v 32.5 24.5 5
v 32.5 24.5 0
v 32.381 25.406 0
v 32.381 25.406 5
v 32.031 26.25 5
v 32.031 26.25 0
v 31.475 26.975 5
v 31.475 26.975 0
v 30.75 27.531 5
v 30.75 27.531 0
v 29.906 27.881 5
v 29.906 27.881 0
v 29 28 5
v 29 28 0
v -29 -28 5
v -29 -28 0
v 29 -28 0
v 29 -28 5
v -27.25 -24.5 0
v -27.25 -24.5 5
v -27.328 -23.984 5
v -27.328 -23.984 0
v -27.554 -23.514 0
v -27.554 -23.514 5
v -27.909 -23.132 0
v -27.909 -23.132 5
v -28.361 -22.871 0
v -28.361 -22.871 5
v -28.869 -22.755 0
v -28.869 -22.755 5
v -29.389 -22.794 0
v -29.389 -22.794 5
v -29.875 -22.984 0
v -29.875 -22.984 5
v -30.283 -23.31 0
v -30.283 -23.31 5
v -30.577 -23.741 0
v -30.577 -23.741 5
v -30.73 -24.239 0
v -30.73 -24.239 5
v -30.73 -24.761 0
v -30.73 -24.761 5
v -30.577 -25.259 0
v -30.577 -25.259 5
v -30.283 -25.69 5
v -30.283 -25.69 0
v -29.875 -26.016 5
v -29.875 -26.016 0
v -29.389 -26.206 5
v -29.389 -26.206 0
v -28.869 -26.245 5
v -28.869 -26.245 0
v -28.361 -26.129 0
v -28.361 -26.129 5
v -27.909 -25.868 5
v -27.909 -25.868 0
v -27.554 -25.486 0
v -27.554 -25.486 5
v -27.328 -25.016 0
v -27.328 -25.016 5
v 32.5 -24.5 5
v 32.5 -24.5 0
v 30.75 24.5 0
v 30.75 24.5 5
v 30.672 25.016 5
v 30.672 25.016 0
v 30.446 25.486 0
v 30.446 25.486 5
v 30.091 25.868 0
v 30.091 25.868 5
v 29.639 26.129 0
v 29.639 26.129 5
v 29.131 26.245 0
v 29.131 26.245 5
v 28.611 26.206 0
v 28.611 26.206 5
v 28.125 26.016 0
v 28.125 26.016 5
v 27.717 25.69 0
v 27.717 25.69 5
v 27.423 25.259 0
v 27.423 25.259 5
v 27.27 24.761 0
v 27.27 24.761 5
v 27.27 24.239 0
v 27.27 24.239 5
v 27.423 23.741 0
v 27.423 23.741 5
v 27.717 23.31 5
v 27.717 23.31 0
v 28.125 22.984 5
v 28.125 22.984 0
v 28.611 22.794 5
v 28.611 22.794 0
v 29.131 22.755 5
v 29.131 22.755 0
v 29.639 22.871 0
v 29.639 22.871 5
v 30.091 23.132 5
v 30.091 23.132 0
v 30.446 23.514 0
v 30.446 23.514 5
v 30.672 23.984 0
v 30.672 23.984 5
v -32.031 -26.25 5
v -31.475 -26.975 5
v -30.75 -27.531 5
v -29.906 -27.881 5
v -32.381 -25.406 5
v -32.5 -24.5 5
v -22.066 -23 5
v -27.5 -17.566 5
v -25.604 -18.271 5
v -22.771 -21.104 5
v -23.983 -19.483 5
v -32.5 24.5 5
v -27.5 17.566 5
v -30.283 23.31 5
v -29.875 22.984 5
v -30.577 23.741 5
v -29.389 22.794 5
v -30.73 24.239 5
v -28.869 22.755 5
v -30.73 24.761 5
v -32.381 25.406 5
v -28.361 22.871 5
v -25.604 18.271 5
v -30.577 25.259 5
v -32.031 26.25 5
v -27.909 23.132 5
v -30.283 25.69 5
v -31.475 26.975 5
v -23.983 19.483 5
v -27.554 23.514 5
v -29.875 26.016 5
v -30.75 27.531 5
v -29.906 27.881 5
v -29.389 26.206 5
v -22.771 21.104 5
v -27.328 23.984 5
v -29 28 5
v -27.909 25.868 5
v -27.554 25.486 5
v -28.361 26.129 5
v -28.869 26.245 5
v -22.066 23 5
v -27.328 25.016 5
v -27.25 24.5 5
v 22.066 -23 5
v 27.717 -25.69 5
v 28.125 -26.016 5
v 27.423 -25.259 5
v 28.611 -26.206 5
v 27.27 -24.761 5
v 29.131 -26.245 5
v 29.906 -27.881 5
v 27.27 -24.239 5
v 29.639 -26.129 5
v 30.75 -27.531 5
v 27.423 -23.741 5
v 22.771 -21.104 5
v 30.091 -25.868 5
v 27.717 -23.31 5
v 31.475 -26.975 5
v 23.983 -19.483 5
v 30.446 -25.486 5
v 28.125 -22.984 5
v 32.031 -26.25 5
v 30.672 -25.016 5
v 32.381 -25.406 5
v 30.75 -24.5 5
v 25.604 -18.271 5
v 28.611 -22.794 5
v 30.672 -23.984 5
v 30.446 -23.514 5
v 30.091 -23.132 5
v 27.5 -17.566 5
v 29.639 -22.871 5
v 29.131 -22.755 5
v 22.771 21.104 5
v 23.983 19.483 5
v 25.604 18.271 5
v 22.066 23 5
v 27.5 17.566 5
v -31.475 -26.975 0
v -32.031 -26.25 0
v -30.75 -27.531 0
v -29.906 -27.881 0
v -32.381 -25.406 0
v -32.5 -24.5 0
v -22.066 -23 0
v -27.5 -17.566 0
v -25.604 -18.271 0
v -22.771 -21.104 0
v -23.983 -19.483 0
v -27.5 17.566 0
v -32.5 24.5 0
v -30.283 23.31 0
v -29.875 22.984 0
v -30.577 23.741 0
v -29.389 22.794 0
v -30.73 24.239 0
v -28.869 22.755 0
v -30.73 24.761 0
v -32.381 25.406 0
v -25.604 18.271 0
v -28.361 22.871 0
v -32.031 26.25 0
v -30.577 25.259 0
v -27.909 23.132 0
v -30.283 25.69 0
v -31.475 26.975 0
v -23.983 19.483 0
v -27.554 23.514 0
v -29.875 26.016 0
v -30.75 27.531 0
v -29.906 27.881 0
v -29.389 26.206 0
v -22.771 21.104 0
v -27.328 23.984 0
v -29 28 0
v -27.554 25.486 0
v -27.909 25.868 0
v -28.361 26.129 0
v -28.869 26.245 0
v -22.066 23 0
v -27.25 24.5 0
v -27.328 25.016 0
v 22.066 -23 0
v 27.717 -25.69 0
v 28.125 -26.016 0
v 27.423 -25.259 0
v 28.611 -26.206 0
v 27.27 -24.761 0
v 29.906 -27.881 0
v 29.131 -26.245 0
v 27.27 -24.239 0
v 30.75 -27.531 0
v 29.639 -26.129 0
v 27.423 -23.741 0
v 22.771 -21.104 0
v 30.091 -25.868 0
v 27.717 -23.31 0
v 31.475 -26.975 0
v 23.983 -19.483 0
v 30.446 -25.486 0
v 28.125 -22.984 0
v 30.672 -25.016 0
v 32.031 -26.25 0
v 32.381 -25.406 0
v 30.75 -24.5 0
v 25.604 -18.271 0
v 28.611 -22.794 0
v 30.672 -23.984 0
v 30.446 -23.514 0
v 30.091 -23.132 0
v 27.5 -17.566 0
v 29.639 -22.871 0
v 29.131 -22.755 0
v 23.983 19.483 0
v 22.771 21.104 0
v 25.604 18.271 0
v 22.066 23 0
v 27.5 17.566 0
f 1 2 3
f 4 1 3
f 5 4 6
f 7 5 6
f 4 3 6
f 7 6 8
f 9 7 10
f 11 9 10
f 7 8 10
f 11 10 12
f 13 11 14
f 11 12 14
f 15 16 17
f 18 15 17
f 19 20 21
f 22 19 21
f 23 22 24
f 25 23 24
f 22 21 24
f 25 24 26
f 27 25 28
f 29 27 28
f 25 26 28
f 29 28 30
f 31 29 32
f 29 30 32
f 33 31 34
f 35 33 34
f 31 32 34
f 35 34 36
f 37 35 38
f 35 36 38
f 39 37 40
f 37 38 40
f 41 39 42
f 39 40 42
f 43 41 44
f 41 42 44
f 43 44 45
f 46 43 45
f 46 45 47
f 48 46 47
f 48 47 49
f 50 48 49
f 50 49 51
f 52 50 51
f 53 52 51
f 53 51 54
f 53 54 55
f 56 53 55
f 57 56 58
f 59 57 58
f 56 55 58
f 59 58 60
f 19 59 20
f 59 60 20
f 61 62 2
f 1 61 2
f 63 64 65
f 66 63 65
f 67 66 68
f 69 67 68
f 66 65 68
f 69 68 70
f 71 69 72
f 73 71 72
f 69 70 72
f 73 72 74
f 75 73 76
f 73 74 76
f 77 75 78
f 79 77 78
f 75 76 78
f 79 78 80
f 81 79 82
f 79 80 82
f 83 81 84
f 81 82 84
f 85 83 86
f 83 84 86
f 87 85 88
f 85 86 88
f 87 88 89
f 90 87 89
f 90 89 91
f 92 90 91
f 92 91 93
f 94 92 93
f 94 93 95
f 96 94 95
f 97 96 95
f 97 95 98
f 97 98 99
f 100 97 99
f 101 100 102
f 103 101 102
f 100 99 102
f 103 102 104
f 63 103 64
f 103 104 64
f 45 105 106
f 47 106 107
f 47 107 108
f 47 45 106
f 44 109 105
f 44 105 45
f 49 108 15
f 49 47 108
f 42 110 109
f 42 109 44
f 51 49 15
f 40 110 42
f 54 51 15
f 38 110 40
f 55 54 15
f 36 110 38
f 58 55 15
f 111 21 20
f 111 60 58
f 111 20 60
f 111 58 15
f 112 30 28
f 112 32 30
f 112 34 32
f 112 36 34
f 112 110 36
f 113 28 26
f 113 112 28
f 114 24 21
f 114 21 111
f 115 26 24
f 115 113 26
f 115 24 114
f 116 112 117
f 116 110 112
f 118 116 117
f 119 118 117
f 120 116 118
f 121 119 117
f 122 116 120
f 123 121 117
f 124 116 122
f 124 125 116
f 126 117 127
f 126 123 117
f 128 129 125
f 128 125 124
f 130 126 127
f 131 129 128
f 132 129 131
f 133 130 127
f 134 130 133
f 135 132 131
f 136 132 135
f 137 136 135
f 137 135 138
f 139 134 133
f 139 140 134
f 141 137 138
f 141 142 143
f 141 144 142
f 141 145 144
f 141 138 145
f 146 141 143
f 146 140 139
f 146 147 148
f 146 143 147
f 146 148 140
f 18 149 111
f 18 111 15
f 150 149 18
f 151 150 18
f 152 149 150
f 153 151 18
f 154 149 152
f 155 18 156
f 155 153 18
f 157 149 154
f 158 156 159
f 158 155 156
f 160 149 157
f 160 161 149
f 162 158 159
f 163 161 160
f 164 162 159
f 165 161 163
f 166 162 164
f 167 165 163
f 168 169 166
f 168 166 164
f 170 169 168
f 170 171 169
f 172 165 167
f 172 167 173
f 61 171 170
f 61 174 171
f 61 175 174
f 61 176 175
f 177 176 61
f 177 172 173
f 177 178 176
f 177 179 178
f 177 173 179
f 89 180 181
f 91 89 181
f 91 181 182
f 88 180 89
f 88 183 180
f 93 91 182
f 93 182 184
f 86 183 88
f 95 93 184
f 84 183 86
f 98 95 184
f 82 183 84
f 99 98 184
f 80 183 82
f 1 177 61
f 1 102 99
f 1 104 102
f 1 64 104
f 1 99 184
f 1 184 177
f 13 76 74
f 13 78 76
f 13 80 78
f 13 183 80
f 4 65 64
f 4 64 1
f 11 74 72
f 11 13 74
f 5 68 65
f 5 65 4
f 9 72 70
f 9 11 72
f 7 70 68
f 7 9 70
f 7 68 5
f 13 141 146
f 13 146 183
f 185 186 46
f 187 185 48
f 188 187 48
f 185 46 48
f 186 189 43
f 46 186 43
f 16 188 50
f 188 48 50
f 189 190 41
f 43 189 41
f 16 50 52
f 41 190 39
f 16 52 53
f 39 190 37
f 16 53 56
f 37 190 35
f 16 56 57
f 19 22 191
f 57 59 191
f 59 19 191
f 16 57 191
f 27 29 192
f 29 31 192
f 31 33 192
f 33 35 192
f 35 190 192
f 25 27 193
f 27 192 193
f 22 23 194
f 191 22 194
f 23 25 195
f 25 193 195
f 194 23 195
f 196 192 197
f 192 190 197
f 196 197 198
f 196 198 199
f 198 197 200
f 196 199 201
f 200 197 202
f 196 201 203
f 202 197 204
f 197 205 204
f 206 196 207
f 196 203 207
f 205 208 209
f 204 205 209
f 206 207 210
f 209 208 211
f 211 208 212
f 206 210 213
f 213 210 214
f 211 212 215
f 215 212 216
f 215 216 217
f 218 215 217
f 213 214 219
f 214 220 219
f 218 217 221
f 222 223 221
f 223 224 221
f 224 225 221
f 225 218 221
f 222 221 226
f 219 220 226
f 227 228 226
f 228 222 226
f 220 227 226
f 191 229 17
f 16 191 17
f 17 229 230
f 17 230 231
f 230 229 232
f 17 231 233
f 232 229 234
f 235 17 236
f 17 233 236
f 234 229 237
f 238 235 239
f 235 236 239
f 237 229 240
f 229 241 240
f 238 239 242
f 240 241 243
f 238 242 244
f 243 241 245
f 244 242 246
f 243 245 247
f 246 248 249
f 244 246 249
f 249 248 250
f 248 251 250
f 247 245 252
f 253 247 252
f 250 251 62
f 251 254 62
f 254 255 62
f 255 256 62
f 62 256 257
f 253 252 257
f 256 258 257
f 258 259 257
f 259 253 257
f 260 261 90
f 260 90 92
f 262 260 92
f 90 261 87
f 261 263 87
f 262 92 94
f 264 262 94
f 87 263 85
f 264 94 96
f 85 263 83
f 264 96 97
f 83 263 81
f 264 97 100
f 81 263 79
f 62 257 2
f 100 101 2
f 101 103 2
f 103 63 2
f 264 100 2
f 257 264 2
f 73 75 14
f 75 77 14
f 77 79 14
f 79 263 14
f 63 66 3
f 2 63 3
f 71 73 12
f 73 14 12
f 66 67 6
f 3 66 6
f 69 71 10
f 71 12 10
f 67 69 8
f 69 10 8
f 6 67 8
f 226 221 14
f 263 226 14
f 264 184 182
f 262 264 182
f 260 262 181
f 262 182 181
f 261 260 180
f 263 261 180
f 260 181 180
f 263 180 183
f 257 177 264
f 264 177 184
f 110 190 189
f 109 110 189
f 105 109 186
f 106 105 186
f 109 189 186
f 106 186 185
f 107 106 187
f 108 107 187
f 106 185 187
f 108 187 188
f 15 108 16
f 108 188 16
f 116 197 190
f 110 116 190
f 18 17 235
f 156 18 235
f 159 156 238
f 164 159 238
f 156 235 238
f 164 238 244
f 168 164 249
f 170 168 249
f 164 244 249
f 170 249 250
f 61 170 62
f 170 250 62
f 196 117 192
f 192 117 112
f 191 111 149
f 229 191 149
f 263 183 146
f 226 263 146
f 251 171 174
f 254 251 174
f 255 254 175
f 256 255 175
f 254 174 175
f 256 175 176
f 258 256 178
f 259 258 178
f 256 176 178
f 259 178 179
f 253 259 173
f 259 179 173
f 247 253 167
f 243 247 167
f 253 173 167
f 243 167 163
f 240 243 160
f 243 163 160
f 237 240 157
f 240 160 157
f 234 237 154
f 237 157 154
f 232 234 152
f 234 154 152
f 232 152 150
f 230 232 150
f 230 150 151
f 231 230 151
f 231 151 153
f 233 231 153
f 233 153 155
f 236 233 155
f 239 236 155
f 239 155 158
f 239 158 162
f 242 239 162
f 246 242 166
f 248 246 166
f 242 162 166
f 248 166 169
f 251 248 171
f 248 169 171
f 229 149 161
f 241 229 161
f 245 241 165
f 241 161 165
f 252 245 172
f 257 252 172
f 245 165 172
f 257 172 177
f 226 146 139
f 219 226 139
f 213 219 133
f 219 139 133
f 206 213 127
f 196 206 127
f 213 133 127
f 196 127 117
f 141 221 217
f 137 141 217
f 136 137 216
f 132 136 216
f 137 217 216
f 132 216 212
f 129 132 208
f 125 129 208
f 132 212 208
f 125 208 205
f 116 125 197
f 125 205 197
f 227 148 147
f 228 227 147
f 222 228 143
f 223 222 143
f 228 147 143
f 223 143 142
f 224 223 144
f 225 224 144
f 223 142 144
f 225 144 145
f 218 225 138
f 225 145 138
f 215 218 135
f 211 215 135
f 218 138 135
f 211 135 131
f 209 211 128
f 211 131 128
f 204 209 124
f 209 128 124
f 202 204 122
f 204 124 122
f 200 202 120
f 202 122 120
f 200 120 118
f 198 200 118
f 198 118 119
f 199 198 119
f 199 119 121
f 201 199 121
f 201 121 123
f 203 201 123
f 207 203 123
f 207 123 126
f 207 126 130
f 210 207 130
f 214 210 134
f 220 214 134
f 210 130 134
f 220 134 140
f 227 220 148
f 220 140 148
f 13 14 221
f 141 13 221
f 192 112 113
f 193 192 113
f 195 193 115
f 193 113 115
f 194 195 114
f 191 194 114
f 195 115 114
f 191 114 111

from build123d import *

# Parameters (mm, degrees)
F1_DEPTH = 5
F2_R     = 1.75
F3_DEPTH = 5
F5_DEPTH = 5


with BuildPart() as f1:
    # F0 (on Top) → F1 (new body)
    with BuildSketch(Plane.XY):
        with BuildLine():
            Line((-29, -28), (29, -28))
            ThreePointArc((29, -28), (31.474874, -26.974874), (32.5, -24.5))
            Line((32.5, -24.5), (32.5, 24.5))
            ThreePointArc((32.5, 24.5), (31.474874, 26.974874), (29, 28))
            Line((29, 28), (-29, 28))
            ThreePointArc((-29, 28), (-31.474874, 26.974874), (-32.5, 24.5))
            Line((-32.5, 24.5), (-32.5, -24.5))
            ThreePointArc((-32.5, -24.5), (-31.474874, -26.974874), (-29, -28))
        make_face()
    extrude(amount=F1_DEPTH)

    # F2 (on face) → F3 (cut)
    with BuildSketch(Plane.XY.offset(5)):
        with Locations((-29, 24.5)):
            Circle(F2_R)
        with Locations((29, 24.5)):
            Circle(F2_R)
        with Locations((29, -24.5)):
            Circle(F2_R)
        with Locations((-29, -24.5)):
            Circle(F2_R)
    extrude(amount=-F3_DEPTH, mode=Mode.SUBTRACT)

    # F4 (on face) → F5 (cut)
    with BuildSketch(Plane.XY.offset(5)):
        with BuildLine():
            Line((22.065871, 23), (-22.065871, 23))
            ThreePointArc((-22.065871, 23), (-23.98342, 19.48342), (-27.5, 17.565871))
            Line((-27.5, 17.565871), (-27.5, -17.565871))
            ThreePointArc((-27.5, -17.565871), (-23.98342, -19.48342), (-22.065871, -23))
            Line((-22.065871, -23), (22.065871, -23))
            ThreePointArc((22.065871, -23), (23.98342, -19.48342), (27.5, -17.565871))
            Line((27.5, -17.565871), (27.5, 17.565871))
            ThreePointArc((27.5, 17.565871), (23.98342, 19.48342), (22.065871, 23))
        make_face()
    extrude(amount=-F5_DEPTH, mode=Mode.SUBTRACT)


solid = f1.part
